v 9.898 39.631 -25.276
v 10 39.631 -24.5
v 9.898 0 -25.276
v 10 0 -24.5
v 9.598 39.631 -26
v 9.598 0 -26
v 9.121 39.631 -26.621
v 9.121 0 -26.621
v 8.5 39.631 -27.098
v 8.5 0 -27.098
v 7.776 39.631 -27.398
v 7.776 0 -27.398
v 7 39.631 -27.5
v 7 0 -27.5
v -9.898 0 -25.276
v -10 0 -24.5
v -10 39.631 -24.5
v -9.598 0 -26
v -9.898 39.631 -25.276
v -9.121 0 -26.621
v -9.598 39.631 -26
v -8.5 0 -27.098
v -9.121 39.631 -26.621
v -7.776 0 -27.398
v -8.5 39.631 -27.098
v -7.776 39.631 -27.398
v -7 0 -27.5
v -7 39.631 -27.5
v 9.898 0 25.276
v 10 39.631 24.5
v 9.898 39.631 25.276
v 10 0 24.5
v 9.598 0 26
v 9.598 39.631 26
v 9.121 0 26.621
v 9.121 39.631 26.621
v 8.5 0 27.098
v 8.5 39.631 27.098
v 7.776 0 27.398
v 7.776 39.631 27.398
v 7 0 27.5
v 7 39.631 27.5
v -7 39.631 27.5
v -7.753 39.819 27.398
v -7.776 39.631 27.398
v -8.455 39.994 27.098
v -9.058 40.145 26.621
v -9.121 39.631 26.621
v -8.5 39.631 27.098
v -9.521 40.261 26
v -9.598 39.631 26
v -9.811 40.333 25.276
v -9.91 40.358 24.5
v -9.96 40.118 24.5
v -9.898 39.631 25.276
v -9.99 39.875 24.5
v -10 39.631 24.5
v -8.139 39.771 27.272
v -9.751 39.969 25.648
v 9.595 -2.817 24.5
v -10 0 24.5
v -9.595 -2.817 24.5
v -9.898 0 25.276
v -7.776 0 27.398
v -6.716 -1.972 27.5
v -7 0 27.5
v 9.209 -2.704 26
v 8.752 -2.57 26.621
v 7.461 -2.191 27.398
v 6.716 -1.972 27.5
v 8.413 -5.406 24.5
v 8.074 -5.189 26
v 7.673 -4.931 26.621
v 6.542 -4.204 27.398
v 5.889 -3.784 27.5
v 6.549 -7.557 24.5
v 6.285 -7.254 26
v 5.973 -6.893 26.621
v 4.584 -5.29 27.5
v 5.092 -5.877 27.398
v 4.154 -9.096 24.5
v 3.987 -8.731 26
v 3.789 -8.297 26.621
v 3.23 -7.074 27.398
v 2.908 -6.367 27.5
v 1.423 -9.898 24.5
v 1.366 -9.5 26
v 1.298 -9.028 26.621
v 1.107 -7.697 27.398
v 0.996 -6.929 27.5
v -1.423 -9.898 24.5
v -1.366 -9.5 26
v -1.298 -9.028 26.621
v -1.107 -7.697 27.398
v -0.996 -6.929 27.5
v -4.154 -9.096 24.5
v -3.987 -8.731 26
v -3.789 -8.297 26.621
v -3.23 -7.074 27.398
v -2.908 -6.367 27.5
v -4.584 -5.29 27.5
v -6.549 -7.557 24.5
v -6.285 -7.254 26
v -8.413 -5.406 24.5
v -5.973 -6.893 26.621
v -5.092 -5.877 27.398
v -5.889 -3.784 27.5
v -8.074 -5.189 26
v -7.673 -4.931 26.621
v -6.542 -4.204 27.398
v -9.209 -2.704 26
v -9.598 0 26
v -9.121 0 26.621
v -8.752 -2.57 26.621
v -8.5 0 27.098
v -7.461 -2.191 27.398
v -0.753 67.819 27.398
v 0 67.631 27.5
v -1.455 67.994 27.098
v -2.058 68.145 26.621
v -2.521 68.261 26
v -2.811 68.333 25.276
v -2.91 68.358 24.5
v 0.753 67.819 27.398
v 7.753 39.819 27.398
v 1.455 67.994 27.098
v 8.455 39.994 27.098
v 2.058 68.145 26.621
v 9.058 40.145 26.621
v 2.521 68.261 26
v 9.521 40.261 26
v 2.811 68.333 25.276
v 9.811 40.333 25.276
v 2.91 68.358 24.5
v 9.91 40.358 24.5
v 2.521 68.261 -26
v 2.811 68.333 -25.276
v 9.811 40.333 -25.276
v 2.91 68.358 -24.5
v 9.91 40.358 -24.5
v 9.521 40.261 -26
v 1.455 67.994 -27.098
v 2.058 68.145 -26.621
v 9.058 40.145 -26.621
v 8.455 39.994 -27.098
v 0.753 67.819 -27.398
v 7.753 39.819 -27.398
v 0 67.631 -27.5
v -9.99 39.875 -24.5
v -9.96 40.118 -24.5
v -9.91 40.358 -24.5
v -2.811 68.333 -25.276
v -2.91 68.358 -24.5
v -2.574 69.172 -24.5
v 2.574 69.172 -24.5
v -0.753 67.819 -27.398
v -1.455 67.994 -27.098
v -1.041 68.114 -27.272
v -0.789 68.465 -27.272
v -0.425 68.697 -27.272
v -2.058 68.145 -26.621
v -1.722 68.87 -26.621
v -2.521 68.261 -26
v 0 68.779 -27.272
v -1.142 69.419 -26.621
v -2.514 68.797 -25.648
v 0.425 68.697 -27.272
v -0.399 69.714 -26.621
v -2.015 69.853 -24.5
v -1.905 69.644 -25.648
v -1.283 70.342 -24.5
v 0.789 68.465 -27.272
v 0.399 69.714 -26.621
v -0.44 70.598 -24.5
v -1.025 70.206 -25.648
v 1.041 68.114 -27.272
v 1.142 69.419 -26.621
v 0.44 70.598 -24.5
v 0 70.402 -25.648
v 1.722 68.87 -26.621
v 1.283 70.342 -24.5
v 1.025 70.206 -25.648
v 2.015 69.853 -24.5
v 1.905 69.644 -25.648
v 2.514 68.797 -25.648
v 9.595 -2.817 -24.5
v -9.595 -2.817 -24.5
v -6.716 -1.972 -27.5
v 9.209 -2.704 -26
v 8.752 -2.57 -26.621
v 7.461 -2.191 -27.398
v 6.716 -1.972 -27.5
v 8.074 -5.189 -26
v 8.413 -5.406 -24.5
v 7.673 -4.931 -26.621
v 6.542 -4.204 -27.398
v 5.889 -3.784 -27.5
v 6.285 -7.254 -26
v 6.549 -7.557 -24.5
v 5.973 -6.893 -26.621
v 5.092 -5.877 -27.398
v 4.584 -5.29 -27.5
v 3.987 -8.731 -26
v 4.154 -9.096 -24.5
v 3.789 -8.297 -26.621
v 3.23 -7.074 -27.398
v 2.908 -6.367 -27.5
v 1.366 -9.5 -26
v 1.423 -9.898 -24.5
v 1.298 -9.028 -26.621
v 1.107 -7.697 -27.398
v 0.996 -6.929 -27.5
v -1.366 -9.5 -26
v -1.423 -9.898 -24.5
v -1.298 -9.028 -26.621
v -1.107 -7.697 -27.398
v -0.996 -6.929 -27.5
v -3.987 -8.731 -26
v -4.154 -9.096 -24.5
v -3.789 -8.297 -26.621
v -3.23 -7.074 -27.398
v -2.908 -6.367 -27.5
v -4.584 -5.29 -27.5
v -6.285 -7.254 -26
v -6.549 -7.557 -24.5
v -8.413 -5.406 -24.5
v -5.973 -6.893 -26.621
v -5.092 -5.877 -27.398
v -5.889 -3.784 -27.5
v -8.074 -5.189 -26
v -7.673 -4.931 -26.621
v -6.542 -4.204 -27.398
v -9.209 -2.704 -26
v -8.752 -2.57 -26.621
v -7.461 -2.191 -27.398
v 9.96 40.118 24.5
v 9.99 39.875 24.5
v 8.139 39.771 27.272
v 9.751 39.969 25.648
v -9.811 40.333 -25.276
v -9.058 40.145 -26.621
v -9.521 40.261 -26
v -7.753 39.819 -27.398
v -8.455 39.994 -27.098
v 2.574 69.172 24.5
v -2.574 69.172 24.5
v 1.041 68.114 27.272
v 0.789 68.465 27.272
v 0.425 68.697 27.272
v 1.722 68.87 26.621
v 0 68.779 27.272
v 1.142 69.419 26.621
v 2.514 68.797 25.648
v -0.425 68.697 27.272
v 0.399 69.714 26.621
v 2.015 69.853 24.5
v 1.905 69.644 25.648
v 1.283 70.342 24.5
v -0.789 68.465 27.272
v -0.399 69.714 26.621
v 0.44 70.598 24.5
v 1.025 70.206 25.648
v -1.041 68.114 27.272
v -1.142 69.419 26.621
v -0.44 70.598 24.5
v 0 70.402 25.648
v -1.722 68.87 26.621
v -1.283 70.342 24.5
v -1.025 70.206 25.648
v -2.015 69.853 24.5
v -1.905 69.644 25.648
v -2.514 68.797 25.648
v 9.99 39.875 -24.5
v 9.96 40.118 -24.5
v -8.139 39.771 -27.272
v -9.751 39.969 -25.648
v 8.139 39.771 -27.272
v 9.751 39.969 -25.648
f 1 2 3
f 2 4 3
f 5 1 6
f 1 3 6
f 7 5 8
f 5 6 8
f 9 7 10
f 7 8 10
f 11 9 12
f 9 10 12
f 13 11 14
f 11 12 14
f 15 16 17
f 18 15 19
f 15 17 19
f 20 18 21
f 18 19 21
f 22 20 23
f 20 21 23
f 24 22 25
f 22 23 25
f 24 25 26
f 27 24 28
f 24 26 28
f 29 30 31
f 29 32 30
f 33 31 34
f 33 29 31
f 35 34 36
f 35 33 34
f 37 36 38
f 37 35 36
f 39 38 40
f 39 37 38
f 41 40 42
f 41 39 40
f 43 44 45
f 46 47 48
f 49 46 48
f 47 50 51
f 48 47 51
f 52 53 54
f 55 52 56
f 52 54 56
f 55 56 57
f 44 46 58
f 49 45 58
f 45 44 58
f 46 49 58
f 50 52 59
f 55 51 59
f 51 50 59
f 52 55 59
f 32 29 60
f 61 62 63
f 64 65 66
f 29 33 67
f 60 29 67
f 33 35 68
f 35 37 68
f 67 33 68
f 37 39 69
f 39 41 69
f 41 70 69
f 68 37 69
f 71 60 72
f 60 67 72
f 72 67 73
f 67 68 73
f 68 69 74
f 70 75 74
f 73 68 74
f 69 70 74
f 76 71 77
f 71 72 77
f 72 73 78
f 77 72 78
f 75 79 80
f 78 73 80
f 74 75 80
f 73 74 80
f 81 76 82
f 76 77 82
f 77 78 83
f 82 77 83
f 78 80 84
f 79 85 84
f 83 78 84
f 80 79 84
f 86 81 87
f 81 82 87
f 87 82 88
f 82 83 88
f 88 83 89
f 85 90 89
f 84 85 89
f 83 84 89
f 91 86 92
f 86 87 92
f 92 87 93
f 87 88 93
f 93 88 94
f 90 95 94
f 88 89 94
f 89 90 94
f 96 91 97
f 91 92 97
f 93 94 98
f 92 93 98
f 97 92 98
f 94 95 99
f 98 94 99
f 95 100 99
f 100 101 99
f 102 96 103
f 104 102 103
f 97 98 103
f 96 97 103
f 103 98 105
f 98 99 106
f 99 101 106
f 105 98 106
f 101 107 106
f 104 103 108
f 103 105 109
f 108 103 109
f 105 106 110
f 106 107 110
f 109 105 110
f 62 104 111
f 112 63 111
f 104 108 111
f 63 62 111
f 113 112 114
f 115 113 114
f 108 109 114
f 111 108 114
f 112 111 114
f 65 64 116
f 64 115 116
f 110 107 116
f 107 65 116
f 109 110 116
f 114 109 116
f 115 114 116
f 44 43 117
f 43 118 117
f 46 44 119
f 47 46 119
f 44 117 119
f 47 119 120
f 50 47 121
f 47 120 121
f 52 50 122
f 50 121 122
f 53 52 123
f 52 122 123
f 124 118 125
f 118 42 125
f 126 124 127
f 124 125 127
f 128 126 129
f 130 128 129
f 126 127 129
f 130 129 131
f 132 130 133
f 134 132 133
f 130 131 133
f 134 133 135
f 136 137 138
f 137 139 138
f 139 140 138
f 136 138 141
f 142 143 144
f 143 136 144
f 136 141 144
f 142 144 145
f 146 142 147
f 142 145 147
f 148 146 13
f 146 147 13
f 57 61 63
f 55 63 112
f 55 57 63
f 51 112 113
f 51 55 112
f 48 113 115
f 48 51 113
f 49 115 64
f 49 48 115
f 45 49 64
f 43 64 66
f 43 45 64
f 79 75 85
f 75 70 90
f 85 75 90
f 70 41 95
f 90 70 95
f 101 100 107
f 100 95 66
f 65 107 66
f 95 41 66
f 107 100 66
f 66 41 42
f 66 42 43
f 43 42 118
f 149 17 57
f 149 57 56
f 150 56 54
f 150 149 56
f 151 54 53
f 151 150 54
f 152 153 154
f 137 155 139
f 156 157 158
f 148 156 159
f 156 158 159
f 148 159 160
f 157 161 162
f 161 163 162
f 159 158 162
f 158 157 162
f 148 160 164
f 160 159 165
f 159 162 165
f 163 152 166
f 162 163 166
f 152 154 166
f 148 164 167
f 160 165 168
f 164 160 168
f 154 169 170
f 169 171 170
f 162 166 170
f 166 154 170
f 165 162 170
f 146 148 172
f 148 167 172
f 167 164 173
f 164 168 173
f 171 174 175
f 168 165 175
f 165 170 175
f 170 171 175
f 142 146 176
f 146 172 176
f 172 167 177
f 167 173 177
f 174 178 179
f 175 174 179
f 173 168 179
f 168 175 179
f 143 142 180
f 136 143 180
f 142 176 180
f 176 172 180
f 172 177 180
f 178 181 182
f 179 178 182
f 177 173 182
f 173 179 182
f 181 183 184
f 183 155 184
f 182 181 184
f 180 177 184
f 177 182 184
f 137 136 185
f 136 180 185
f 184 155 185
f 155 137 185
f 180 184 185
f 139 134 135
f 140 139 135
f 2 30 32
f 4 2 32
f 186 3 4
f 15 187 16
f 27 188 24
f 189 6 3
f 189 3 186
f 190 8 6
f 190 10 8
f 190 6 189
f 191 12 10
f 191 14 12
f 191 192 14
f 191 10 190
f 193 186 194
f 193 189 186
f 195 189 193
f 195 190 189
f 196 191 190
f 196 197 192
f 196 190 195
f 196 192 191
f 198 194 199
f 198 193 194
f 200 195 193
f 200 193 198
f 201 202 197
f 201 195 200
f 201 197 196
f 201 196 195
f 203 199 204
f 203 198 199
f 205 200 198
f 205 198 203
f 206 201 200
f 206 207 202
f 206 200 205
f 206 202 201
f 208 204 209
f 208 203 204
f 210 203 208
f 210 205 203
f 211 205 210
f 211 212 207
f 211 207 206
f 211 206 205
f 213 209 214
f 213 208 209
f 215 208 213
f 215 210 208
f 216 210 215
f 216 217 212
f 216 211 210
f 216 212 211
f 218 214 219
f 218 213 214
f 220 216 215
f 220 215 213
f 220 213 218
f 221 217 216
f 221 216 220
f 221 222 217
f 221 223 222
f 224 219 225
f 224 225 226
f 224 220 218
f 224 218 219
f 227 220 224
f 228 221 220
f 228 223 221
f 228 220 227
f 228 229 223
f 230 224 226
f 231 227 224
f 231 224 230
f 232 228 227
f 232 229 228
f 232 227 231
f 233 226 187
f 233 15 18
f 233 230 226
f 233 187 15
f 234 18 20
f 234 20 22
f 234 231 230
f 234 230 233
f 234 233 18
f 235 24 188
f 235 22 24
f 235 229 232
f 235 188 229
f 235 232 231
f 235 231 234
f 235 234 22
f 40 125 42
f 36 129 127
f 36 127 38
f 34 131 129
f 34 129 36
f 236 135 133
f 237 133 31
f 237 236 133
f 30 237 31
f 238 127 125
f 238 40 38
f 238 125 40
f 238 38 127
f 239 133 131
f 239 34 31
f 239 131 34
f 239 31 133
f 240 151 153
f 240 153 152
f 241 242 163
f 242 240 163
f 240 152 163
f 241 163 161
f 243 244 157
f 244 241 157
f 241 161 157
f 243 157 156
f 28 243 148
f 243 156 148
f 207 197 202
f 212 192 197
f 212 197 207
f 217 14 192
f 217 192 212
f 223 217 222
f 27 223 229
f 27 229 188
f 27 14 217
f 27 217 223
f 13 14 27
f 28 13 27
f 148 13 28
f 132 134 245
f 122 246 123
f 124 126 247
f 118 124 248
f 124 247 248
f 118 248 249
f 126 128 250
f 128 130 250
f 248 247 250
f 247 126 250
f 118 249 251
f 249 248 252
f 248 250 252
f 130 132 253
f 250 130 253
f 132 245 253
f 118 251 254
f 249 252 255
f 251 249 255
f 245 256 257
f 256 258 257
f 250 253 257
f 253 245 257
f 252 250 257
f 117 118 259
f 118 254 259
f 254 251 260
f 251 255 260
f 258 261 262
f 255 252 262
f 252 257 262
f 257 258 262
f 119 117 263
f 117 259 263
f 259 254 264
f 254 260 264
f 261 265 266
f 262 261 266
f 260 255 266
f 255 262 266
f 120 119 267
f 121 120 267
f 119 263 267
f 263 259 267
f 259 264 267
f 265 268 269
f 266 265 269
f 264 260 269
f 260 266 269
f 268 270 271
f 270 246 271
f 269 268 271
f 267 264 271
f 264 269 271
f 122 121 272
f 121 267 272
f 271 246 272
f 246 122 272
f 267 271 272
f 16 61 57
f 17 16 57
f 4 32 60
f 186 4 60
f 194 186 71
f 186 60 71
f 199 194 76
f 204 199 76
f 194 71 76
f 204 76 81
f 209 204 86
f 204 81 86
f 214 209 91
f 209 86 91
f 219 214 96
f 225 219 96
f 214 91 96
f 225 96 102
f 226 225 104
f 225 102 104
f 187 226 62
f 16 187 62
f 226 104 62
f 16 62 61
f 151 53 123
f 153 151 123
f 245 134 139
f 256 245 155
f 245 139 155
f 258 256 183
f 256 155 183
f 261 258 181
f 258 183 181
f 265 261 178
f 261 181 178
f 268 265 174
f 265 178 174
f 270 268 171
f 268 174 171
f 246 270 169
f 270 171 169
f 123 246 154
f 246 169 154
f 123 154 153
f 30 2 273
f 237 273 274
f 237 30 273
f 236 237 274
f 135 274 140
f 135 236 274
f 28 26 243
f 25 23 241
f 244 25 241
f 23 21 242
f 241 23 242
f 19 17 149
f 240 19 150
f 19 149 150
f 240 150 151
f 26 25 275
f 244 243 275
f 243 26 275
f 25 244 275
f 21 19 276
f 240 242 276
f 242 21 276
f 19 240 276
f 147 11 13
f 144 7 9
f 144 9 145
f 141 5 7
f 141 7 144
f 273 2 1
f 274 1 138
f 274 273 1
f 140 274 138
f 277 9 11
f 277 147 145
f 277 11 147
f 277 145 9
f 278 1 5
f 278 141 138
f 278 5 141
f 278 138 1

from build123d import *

# Parameters (mm, degrees)
BOSS_EXTRUDE1_DEPTH = 27.5
FILLET1_R           = 3


with BuildPart() as part:
    # Sketch1 → Boss-Extrude1 (new body, symmetric)
    with BuildSketch(Plane.XY):
        with BuildLine():
            Line((-10, 0), (-10, 40))
            Line((-10, 40), (0, 80))
            Line((0, 80), (10, 40))
            Line((10, 40), (10, 0))
            ThreePointArc((10, 0), (0, -10), (-10, 0))
        make_face()
    extrude(amount=BOSS_EXTRUDE1_DEPTH, both=True)

    # Fillet1
    fillet1_edges = [part.edges().sort_by_distance(p)[0] for p in [
        (5, 60, 27.5),
        (-5, 60, 27.5),
        (-10, 20, 27.5),
        (0, -10, 27.5),
        (-10, 20, -27.5),
        (-5, 60, -27.5),
        (5, 60, -27.5),
        (10, 20, -27.5),
        (0, -10, -27.5),
        (10, 20, 27.5),
        (-10, 40, 0),
        (0, 80, 0),
        (10, 40, 0),
    ]]
    fillet(fillet1_edges, radius=FILLET1_R)


solid = part.part
